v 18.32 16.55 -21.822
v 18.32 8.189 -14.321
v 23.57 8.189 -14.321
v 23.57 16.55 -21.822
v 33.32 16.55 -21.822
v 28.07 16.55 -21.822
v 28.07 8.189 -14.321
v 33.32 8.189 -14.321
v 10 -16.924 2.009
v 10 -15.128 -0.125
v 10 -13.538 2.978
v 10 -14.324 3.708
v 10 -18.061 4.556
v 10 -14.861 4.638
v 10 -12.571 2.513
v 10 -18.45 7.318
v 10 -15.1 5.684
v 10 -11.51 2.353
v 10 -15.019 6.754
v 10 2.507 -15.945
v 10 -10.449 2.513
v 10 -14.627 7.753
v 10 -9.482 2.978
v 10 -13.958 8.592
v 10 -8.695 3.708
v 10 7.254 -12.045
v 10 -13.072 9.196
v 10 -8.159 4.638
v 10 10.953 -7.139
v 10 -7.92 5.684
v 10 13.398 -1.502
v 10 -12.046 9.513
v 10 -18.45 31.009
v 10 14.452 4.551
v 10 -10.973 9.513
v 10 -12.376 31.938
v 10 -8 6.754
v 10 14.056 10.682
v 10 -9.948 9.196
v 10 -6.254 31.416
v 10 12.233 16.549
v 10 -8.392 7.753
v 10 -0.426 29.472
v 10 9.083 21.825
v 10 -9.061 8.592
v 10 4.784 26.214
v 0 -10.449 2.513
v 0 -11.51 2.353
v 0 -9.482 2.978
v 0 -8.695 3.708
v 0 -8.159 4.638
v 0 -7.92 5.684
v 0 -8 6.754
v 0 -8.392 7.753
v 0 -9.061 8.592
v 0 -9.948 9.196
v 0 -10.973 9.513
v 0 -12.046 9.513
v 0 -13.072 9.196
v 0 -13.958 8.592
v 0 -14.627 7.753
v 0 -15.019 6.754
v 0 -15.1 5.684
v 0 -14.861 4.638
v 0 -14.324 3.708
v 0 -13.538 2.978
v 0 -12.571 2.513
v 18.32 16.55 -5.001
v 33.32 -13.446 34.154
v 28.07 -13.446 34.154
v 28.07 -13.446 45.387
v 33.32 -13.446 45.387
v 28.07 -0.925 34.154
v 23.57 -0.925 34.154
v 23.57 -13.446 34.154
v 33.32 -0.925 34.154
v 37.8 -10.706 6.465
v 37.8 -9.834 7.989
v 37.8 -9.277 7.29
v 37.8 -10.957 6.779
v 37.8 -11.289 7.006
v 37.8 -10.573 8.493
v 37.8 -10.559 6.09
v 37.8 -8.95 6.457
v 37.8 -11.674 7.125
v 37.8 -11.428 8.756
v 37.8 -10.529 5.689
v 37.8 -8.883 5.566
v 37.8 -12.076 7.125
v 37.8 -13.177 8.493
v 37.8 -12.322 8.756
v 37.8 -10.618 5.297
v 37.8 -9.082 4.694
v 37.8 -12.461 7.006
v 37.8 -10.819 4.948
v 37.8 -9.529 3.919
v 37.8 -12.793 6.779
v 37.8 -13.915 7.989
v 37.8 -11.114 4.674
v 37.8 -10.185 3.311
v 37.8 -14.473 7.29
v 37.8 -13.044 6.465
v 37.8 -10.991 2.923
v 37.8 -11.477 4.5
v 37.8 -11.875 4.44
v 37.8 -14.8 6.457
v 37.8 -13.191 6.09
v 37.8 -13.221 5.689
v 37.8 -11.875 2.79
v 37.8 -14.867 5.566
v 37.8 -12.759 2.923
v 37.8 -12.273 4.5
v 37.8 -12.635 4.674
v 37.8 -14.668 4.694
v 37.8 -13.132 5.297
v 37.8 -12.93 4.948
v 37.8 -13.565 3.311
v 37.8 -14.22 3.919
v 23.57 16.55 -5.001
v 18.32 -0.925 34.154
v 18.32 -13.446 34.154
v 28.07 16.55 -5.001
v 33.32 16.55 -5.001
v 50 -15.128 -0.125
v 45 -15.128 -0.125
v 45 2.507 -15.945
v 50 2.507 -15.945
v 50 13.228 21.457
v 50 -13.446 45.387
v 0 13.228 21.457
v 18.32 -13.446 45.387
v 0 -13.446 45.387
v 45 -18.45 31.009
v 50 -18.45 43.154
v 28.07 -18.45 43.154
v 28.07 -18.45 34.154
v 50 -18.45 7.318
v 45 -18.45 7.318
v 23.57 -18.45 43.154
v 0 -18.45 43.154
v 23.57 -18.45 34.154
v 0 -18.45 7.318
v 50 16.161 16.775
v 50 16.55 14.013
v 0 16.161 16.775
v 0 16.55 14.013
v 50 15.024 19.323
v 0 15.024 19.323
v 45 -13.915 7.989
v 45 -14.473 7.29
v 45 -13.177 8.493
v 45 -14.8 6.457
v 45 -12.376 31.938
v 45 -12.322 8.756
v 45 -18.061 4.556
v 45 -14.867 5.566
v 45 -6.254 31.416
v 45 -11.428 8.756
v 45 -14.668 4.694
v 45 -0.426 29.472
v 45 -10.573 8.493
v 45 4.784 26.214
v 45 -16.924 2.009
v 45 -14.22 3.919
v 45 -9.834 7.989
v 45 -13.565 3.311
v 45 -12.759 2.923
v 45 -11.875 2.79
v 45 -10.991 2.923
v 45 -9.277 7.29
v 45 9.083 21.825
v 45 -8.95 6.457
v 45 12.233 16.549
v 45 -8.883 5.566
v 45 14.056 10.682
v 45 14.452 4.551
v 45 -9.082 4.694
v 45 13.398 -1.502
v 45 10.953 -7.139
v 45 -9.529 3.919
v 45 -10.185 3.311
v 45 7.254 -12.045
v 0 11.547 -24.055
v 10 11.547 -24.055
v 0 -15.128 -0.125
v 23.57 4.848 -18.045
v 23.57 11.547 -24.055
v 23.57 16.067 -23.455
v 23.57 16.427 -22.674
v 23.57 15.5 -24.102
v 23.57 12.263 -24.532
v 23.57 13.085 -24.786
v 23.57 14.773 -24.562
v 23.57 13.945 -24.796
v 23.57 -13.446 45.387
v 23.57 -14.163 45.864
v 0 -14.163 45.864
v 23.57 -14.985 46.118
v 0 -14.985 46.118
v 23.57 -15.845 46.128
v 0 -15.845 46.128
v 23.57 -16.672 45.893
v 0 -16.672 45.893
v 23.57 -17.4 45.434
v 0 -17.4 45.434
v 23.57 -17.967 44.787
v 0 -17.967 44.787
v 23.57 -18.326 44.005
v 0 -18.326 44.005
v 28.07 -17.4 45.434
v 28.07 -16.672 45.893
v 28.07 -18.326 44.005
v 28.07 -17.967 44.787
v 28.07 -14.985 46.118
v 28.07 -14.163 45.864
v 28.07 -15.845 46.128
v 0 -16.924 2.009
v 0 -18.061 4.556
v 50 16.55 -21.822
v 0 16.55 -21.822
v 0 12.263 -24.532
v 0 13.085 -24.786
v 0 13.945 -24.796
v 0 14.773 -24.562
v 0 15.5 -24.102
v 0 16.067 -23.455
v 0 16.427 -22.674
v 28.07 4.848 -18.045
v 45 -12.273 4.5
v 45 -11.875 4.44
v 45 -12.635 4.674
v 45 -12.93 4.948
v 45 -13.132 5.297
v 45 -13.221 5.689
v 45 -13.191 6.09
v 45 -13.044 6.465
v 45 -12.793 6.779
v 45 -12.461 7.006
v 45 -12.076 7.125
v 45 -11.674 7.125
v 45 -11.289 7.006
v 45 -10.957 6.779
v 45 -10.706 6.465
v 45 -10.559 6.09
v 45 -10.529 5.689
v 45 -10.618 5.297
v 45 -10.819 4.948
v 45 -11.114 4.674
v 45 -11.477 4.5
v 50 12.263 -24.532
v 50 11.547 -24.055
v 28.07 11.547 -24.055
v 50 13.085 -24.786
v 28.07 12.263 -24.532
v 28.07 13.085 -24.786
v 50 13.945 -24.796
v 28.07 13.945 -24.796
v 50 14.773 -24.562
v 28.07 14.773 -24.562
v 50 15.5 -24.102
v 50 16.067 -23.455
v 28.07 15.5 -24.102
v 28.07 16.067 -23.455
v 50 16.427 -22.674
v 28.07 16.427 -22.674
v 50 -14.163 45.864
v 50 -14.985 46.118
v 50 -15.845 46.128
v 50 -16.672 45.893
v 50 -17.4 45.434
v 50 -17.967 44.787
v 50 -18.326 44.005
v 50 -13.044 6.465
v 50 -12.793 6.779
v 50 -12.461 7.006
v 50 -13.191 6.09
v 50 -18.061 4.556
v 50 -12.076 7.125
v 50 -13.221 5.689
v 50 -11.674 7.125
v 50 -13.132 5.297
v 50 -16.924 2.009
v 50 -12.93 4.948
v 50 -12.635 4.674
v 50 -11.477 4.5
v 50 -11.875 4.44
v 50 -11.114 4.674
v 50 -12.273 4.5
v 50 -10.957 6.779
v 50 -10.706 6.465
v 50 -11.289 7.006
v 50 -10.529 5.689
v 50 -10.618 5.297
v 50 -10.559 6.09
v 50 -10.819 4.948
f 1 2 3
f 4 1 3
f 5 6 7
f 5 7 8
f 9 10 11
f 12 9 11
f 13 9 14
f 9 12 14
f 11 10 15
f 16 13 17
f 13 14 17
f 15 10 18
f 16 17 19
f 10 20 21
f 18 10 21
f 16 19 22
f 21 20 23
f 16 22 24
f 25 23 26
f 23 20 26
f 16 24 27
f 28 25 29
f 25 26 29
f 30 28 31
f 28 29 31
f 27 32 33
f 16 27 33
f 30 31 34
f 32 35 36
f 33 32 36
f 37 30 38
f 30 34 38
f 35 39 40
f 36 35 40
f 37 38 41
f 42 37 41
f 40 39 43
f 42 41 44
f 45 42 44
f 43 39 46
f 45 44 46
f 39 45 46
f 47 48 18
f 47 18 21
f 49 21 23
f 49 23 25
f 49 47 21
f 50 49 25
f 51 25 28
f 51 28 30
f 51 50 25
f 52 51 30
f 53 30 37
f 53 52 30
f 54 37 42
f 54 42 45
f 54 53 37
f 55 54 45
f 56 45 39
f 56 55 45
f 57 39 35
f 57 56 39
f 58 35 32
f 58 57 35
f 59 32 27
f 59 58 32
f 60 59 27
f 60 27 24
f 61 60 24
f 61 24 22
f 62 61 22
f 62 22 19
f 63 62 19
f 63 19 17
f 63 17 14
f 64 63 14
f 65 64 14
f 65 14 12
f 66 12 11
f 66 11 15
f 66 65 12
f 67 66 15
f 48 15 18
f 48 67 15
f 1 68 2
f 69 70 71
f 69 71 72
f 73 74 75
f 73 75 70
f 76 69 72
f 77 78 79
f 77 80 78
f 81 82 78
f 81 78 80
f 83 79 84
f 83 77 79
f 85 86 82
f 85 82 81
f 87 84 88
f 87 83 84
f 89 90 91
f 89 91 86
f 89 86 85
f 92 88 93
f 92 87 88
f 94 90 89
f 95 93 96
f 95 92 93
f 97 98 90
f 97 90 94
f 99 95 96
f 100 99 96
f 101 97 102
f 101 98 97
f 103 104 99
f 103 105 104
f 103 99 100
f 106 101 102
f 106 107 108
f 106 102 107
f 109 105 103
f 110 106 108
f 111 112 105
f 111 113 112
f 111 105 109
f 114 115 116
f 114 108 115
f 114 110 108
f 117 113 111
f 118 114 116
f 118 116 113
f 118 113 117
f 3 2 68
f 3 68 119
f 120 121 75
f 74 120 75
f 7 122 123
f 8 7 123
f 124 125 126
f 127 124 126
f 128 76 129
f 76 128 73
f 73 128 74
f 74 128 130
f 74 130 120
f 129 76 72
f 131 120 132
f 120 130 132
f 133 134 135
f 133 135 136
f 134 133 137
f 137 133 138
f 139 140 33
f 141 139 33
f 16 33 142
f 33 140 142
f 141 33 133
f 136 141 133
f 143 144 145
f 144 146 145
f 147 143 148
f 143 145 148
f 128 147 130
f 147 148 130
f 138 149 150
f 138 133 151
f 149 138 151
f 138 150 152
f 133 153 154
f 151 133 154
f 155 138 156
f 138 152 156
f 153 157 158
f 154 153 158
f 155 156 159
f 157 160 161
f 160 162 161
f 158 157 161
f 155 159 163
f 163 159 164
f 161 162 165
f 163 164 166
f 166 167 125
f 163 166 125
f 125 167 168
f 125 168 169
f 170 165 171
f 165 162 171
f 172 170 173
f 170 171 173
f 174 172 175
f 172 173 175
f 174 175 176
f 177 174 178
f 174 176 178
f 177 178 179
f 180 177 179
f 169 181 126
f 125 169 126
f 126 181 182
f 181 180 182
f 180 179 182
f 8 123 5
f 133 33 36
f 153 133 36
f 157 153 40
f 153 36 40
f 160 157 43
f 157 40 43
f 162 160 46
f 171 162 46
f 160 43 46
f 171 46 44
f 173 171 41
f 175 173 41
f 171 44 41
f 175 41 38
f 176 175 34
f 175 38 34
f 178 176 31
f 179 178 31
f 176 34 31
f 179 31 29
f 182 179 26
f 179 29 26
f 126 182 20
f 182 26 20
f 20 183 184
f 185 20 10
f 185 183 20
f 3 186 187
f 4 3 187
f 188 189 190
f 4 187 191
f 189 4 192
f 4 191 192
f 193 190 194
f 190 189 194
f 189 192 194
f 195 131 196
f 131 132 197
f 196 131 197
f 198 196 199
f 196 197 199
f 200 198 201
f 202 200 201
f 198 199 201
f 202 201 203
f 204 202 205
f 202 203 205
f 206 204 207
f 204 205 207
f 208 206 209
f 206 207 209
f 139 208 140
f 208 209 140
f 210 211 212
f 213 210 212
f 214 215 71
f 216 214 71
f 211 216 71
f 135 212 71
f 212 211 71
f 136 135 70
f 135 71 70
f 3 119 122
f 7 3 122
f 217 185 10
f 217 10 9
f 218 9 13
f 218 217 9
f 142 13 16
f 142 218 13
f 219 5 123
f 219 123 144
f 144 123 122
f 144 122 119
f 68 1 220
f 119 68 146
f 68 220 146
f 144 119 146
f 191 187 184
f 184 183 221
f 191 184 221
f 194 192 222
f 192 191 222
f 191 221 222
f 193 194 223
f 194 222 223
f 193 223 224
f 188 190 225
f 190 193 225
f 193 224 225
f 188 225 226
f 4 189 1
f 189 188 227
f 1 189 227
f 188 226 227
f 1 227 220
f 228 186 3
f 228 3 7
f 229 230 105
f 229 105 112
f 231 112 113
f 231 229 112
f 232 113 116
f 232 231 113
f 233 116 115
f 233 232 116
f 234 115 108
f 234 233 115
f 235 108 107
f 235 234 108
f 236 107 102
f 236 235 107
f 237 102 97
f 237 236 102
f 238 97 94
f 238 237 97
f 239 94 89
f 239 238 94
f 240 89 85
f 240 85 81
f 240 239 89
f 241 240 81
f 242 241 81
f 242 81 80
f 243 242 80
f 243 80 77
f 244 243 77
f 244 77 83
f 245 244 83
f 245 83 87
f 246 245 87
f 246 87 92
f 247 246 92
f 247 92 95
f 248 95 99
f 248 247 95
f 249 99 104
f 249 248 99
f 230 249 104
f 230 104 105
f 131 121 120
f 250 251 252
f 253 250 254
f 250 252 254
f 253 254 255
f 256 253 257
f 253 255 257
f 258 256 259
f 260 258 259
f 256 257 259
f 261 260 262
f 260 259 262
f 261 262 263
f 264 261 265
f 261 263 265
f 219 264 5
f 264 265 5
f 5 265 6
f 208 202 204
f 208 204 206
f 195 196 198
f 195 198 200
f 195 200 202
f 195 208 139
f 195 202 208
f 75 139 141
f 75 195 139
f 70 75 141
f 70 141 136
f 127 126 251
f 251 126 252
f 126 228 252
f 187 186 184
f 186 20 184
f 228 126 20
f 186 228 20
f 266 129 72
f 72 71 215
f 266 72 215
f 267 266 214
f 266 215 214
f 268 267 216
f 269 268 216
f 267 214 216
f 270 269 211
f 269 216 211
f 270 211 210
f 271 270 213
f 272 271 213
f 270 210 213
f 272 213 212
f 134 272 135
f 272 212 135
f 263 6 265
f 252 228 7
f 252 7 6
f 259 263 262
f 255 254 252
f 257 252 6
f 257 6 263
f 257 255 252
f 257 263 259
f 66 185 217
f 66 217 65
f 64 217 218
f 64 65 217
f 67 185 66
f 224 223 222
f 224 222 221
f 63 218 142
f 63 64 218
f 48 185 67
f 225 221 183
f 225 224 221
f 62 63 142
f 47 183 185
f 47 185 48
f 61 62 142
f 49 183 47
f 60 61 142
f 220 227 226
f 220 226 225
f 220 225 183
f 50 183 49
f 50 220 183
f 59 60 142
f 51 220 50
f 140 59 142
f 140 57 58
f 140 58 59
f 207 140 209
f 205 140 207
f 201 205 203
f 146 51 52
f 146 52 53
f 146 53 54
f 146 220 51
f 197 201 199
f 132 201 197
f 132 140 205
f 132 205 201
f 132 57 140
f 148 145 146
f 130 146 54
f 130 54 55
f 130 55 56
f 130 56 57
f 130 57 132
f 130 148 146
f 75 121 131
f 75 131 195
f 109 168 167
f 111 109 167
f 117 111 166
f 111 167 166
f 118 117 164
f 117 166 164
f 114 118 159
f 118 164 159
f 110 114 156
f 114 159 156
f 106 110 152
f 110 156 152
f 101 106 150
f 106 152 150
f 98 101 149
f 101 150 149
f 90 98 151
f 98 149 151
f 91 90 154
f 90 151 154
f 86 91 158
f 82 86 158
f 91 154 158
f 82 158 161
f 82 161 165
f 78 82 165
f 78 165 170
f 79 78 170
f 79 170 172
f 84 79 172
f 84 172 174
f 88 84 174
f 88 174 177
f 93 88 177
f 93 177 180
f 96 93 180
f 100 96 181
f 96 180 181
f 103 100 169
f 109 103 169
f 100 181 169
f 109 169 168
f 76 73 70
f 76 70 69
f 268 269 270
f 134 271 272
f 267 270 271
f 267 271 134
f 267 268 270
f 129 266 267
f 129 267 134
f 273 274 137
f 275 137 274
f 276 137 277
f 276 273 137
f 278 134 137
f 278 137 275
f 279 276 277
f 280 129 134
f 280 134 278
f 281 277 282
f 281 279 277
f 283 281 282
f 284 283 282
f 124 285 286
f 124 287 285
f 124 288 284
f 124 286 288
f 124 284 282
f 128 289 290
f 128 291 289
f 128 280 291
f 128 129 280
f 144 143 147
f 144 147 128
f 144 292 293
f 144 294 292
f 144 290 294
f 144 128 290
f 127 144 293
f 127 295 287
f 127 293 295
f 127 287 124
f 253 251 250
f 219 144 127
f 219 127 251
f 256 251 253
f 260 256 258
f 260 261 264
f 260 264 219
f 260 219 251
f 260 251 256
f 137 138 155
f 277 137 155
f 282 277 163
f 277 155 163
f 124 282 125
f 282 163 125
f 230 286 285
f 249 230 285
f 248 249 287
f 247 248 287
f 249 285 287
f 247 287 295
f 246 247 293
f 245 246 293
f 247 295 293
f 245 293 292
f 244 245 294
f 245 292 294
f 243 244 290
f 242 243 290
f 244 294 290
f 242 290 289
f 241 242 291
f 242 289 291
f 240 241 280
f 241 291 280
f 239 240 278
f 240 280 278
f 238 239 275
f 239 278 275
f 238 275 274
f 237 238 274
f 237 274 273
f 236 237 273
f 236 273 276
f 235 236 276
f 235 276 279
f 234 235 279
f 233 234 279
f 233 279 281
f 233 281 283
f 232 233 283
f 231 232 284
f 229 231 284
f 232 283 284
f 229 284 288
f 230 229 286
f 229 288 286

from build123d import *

# Parameters (mm, degrees)
SKETCH4_R            = 3.6
THICKBASE_DEPTH      = 10
MIDDLE_DEPTH         = 35
THINBASE_DEPTH       = 5
SKETCH8_R            = 1.35
RETAINERSCREW_DEPTH  = 5
SKETCH9_R            = 3
SKETCH9_R_2          = 1.35
SPACER_DEPTH         = 7.2
SHOCKHOLE_START      = -35
SKETCH10_W           = 4.5
SKETCH10_H           = 12
SHOCKHOLE_DEPTH      = 17.524613
SKETCH12_W           = 15
SKETCH12_H           = 12.521275246
SHOCKHOLEBASE_DEPTH  = 82.308539587
SKETCH11_W           = 4.5
SKETCH11_H           = 12
SHOCKHOLE2_DEPTH     = 35
SKETCH13_W           = 15
SKETCH13_H           = 12.521275247
SHOCKHOLE2BASE_DEPTH = 80.489490329


with BuildPart() as part:
    # Sketch4 → ThickBase (new body)
    with BuildSketch(Plane(origin=(0, 0, 0), x_dir=(0, 0, -1), z_dir=(1, 0, 0))):
        with BuildLine():
            Line((-14.01318338, 16.550216151), (21.822267157, 16.550216151))
            ThreePointArc((21.822267157, 16.550216151), (24.561793845, 14.77291543), (24.055345362, 11.546878503))
            Line((24.055345362, 11.546878503), (0.125176293, -15.12757601))
            ThreePointArc((0.125176293, -15.12757601), (-3.242753458, -17.581539475), (-7.318417722, -18.449783849))
            Line((-7.318417722, -18.449783849), (-43.153868259, -18.449783849))
            ThreePointArc((-43.153868259, -18.449783849), (-45.893394947, -16.672483128), (-45.386946464, -13.446446201))
            Line((-45.386946464, -13.446446201), (-21.456777395, 13.228008312))
            ThreePointArc((-21.456777395, 13.228008312), (-18.088847644, 15.681971777), (-14.01318338, 16.550216151))
        make_face()
        with Locations((-5.952745457, -11.509649573)):
            Circle(SKETCH4_R, mode=Mode.SUBTRACT)
    extrude(amount=THICKBASE_DEPTH)

    # Sketch5 → Middle (add)
    with BuildSketch(Plane(origin=(10, 0, 0), x_dir=(0, 0, -1), z_dir=(1, 0, 0))):
        with BuildLine():
            Line((15.945305194, 2.506787856), (24.055345362, 11.546878503))
            ThreePointArc((24.055345362, 11.546878503), (24.561793845, 14.77291543), (21.822267157, 16.550216151))
            Line((21.822267157, 16.550216151), (-14.01318338, 16.550216151))
            ThreePointArc((-14.01318338, 16.550216151), (-18.088847644, 15.681971777), (-21.456777395, 13.228008312))
            Line((-21.456777395, 13.228008312), (-45.386946464, -13.446446201))
            ThreePointArc((-45.386946464, -13.446446201), (-45.893394947, -16.672483128), (-43.153868259, -18.449783849))
            Line((-43.153868259, -18.449783849), (-31.009075531, -18.449783849))
            ThreePointArc((-31.009075531, -18.449783849), (-16.549356077, 12.232654103), (15.945305194, 2.506787856))
        make_face()
    extrude(amount=MIDDLE_DEPTH)

    # Sketch7 → ThinBase (add)
    with BuildSketch(Plane(origin=(45, 0, 0), x_dir=(0, 0, -1), z_dir=(1, 0, 0))):
        with BuildLine():
            ThreePointArc((15.945305194, 2.506787856), (-16.549356077, 12.232654103), (-31.009075531, -18.449783849))
            Line((-31.009075531, -18.449783849), (-7.318417722, -18.449783849))
            ThreePointArc((-7.318417722, -18.449783849), (-3.242753458, -17.581539475), (0.125176293, -15.12757601))
            Line((0.125176293, -15.12757601), (15.945305194, 2.506787856))
        make_face()
        with BuildLine():
            Line((-43.153868259, -18.449783849), (-31.009075531, -18.449783849))
            ThreePointArc((-31.009075531, -18.449783849), (-16.549356077, 12.232654103), (15.945305194, 2.506787856))
            Line((15.945305194, 2.506787856), (24.055345362, 11.546878503))
            ThreePointArc((24.055345362, 11.546878503), (24.561793845, 14.77291543), (21.822267157, 16.550216151))
            Line((21.822267157, 16.550216151), (-14.01318338, 16.550216151))
            ThreePointArc((-14.01318338, 16.550216151), (-18.088847644, 15.681971777), (-21.456777395, 13.228008312))
            Line((-21.456777395, 13.228008312), (-45.386946464, -13.446446201))
            ThreePointArc((-45.386946464, -13.446446201), (-45.893394947, -16.672483128), (-43.153868259, -18.449783849))
        make_face()
    extrude(amount=THINBASE_DEPTH)

    # Sketch8 → RetainerScrew (cut)
    with BuildSketch(Plane(origin=(50, 0, 0), x_dir=(0, 0, -1), z_dir=(1, 0, 0))):
        with Locations((-5.789718886, -11.874919798)):
            Circle(SKETCH8_R)
    extrude(amount=-RETAINERSCREW_DEPTH, mode=Mode.SUBTRACT)

    # Sketch9 → Spacer (add)
    with BuildSketch(Plane.ZY.offset(-45)):
        with Locations(Location((5.789718886, -11.874919798, 0), (0, 0, 180))):
            Circle(SKETCH9_R)
        with Locations(Location((5.789718886, -11.874919798, 0), (0, 0, 180))):
            Circle(SKETCH9_R_2, mode=Mode.SUBTRACT)
    extrude(amount=SPACER_DEPTH)

    # Sketch10 → ShockHole (cut)
    with BuildSketch(Plane(origin=(0, 16.564225392, 18.463792524), x_dir=(1, 0, 0), z_dir=(0, 0.6677792161146302, 0.7443594014488768)).offset(SHOCKHOLE_START)):
        with Locations((25.82, 21.65868724)):
            Rectangle(SKETCH10_W, SKETCH10_H)
    extrude(amount=SHOCKHOLE_DEPTH, mode=Mode.SUBTRACT)

    # Sketch12 → ShockHoleBase (cut, through all)
    with BuildSketch(Plane(origin=(0, 11.655691061, -10.45654589), x_dir=(1, 0, 0), z_dir=(0, 0.7443594014488766, -0.6677792161146304))):
        with Locations((25.82, -1.068918271)):
            Rectangle(SKETCH12_W, SKETCH12_H)
    extrude(amount=SHOCKHOLEBASE_DEPTH, mode=Mode.SUBTRACT)

    # Sketch11 → ShockHole2 (cut)
    with BuildSketch(Plane(origin=(0, 16.550216151, 0), x_dir=(1, 0, 0), z_dir=(0, 1, 0))):
        with Locations((25.82, -40.153868259)):
            Rectangle(SKETCH11_W, SKETCH11_H)
    extrude(amount=-SHOCKHOLE2_DEPTH, mode=Mode.SUBTRACT)

    # Sketch13 → ShockHole2Base (cut, through all)
    with BuildSketch(Plane.XY.offset(34.153868259)):
        with Locations((25.82, -7.185808578)):
            Rectangle(SKETCH13_W, SKETCH13_H)
    extrude(amount=SHOCKHOLE2BASE_DEPTH, mode=Mode.SUBTRACT)


solid = part.part
